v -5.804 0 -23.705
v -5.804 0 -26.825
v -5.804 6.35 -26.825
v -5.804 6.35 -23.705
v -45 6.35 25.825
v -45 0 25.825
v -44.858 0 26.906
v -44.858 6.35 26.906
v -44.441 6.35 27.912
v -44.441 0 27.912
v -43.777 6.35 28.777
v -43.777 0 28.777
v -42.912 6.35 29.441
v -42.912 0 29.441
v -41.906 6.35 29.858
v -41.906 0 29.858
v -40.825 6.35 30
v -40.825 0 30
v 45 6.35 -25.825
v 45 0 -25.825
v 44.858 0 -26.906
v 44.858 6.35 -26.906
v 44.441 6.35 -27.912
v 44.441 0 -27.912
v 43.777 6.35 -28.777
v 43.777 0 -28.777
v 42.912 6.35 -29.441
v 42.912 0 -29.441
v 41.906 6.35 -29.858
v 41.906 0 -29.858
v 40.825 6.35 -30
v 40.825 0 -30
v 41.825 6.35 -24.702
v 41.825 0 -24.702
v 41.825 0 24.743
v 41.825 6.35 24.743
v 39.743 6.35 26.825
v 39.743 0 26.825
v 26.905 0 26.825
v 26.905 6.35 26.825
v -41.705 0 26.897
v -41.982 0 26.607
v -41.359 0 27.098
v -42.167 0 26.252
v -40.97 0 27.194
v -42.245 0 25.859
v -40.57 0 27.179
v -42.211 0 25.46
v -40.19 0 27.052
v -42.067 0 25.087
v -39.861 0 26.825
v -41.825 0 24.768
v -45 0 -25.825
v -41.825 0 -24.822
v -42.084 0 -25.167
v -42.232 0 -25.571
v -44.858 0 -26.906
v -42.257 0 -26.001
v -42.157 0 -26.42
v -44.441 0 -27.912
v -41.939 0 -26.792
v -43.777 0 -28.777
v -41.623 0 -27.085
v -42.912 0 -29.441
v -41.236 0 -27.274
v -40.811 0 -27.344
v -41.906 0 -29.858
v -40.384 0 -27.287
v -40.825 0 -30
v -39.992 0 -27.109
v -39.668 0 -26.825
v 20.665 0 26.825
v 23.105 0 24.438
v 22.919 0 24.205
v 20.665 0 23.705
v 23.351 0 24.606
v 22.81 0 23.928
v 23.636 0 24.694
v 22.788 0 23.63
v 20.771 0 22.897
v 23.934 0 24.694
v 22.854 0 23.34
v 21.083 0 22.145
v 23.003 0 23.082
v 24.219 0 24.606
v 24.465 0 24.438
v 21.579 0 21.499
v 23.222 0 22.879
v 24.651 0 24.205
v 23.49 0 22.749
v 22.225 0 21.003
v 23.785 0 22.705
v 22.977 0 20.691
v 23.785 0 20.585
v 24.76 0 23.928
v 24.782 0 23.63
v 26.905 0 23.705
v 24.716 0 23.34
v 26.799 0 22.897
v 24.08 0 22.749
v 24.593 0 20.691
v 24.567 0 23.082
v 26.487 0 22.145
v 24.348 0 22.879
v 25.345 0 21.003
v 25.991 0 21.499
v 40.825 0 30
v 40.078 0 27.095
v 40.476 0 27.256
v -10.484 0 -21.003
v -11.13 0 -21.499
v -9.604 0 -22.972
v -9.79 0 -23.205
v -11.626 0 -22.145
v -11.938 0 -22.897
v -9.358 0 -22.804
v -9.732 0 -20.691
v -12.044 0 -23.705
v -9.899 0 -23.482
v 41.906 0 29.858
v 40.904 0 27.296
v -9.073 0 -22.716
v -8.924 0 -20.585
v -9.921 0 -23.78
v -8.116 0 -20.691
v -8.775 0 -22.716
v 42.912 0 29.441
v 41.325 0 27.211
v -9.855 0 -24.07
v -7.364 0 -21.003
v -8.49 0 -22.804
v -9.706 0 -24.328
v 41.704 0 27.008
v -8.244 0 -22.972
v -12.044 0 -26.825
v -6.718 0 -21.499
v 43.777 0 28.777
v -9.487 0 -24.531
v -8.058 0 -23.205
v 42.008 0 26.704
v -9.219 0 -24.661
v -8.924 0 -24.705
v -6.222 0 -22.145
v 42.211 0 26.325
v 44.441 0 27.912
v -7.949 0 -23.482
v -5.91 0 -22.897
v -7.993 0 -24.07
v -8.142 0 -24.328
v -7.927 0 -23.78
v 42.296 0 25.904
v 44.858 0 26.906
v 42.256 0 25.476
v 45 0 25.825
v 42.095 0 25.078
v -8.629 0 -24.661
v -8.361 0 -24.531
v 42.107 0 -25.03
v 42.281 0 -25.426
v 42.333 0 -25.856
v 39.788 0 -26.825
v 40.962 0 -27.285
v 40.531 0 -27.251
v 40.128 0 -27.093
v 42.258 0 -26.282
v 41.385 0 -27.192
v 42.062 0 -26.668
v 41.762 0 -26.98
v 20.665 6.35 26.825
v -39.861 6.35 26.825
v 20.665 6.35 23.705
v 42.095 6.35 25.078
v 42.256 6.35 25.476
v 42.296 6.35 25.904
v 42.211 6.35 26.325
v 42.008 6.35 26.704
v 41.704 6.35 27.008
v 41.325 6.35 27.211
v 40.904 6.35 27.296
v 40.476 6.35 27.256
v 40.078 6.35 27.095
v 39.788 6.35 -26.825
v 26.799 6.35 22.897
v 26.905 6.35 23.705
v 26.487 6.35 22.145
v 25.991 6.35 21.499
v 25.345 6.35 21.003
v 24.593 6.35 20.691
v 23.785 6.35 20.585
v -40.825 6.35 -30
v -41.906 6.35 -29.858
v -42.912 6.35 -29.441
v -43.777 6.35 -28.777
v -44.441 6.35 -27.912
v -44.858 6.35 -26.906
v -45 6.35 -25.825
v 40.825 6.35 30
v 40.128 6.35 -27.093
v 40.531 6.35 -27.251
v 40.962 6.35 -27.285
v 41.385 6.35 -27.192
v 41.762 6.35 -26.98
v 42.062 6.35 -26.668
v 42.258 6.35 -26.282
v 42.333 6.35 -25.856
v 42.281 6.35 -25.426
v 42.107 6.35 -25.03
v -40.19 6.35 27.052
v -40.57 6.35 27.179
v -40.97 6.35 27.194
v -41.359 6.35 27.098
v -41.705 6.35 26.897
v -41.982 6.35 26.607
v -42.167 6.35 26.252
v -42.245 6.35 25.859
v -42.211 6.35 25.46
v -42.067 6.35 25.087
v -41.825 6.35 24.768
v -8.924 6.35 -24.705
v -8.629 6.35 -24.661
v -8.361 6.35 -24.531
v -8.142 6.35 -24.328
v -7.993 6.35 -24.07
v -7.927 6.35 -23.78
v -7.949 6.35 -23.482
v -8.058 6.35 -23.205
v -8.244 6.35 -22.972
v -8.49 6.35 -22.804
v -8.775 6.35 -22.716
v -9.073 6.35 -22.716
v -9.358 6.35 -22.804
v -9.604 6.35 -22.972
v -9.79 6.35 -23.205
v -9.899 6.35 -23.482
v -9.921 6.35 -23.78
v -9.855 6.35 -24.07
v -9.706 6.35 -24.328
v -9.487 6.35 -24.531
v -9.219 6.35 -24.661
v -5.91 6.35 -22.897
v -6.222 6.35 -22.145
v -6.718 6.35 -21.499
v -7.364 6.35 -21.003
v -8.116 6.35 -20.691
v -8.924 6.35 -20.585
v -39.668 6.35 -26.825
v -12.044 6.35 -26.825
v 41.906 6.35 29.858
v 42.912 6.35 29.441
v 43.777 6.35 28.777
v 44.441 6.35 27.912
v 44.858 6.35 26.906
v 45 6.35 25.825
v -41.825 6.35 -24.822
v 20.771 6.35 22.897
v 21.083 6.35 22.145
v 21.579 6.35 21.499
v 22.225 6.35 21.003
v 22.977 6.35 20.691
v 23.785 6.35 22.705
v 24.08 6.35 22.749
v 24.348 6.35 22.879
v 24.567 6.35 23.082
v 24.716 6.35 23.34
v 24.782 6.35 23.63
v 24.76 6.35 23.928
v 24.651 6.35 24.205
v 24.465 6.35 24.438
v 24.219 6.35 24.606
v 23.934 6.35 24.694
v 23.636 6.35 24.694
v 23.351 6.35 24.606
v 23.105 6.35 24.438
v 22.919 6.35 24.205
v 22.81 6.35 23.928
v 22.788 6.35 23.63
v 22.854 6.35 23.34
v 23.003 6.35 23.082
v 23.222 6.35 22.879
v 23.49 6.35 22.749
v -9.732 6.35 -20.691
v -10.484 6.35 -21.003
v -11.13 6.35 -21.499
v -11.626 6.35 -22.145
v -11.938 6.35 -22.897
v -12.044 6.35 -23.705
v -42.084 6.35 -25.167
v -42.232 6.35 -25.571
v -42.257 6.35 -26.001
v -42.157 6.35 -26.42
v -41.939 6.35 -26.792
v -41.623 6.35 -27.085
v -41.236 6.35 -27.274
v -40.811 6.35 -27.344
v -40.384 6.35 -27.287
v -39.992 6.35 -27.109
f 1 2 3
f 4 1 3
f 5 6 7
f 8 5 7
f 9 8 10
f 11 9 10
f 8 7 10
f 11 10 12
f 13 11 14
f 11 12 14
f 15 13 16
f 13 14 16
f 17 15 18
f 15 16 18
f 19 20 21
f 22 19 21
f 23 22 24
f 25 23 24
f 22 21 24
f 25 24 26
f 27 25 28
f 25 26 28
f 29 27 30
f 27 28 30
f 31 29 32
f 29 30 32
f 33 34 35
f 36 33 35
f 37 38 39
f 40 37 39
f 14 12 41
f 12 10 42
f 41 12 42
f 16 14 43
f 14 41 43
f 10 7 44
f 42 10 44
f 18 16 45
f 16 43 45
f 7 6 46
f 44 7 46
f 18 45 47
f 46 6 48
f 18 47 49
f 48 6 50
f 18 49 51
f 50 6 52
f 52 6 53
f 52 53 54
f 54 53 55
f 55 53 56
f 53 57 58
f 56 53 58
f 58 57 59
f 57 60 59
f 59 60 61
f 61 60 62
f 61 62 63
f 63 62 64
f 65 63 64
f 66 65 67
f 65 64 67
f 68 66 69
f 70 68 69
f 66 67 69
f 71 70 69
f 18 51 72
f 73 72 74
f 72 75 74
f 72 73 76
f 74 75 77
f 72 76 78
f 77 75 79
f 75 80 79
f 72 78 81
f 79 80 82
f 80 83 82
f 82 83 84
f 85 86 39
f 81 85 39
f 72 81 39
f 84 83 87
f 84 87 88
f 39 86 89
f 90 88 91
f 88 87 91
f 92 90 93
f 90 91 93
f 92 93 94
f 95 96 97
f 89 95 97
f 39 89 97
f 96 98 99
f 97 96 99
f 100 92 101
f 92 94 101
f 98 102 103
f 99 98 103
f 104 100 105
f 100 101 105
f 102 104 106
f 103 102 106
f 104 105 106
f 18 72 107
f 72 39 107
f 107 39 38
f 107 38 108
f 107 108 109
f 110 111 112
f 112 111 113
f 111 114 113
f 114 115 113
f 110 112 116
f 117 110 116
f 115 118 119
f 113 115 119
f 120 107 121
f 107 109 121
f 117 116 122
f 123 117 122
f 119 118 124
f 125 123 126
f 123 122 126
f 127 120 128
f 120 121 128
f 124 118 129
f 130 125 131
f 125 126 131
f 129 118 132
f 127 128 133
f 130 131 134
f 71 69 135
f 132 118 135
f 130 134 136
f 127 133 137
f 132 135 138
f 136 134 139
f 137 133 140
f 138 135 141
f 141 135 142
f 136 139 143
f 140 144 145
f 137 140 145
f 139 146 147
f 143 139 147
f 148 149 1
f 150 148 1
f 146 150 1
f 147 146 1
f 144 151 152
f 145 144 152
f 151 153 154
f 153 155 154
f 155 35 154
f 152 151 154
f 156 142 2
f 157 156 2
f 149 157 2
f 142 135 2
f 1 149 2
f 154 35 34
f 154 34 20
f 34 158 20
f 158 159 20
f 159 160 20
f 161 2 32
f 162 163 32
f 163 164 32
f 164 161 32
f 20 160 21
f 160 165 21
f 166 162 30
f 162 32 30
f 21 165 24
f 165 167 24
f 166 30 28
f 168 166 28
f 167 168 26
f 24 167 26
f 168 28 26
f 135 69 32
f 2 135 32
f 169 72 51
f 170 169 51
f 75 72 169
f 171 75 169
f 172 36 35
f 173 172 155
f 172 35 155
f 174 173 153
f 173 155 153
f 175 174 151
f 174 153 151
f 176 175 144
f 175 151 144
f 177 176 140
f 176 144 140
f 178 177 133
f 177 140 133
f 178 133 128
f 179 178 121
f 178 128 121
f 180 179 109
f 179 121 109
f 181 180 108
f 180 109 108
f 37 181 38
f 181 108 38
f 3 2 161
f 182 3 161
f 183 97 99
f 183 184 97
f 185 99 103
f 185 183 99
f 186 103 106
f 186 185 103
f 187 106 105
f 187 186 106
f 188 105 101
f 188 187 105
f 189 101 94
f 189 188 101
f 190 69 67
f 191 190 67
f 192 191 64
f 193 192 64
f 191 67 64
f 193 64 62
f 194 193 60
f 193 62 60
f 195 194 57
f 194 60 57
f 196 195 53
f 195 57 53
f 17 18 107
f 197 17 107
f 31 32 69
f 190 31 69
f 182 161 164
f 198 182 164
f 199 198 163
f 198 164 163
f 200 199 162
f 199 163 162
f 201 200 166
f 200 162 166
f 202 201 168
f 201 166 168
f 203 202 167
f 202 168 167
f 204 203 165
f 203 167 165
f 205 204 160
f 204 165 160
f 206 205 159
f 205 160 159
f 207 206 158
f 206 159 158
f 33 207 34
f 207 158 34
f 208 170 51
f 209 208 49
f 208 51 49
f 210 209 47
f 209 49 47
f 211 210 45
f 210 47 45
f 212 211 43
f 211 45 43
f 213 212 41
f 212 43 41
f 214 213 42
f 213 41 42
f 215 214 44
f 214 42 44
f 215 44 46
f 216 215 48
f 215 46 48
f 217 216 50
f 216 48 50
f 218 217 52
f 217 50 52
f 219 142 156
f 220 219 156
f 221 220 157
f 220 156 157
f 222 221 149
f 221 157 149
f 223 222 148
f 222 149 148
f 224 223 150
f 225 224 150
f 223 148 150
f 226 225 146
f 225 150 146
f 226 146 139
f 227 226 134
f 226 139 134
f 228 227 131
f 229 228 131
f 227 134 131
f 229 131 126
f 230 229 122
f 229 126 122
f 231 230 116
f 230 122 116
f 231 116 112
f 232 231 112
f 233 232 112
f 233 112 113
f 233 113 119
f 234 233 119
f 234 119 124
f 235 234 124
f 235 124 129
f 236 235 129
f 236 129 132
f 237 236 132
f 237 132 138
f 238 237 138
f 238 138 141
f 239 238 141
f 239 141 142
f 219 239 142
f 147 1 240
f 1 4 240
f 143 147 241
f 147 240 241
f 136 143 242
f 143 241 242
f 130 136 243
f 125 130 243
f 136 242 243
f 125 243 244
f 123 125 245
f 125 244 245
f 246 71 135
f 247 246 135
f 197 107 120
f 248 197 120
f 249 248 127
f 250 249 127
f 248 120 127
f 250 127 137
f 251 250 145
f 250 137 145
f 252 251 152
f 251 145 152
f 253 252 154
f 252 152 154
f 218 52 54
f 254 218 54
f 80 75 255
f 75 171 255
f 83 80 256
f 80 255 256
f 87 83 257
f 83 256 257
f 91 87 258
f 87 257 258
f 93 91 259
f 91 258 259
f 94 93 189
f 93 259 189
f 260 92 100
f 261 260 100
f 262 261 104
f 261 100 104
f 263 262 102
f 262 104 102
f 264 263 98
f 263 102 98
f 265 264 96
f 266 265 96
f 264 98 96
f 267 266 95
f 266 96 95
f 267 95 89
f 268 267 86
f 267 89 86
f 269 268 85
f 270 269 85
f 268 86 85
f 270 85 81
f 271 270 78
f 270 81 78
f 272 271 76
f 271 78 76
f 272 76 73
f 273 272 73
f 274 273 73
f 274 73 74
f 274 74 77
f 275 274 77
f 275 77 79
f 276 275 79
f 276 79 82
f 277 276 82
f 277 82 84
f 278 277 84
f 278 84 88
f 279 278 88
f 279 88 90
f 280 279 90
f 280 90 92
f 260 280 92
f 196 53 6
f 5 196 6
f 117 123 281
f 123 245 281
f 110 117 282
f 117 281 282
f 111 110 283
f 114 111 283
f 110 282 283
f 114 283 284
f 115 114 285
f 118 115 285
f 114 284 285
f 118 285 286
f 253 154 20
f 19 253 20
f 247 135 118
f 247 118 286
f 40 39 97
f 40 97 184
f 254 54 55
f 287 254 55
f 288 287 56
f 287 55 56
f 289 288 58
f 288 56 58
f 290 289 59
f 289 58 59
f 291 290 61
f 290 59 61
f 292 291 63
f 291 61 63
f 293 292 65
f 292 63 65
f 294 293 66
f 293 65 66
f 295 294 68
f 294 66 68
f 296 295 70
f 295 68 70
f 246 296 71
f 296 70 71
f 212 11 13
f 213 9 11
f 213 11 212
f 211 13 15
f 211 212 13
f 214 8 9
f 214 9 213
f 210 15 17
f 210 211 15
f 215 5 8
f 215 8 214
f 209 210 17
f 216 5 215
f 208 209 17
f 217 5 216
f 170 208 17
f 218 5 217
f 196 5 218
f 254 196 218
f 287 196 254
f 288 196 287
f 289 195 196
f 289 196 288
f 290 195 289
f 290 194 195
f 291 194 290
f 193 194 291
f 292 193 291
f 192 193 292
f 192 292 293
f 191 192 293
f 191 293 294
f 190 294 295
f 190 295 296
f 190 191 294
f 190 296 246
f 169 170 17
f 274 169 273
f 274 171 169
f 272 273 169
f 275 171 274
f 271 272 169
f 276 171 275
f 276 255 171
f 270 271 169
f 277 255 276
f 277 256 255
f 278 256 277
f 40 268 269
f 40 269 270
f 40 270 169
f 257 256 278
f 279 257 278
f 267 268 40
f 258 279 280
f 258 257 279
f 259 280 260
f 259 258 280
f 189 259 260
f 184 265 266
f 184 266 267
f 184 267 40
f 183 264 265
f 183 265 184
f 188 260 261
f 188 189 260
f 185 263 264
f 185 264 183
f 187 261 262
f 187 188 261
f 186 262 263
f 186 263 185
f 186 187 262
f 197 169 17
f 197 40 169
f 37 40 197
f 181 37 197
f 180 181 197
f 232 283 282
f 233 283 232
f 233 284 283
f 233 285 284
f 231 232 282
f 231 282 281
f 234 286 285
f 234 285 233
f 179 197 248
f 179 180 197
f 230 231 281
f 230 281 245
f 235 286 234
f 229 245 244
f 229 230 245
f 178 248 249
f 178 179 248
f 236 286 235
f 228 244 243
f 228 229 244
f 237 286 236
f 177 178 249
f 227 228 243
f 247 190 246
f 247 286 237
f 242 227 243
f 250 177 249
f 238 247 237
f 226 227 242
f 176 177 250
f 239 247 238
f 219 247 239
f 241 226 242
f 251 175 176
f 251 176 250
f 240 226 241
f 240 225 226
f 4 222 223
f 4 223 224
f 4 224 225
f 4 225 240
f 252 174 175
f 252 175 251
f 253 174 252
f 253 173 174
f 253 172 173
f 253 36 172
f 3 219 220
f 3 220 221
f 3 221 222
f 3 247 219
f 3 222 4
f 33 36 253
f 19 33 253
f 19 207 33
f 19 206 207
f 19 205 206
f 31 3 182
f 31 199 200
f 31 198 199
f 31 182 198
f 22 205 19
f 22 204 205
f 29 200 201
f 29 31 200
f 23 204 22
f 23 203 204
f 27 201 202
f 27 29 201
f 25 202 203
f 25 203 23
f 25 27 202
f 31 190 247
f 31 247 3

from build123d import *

# Parameters (mm, degrees)
BOSS_EXTRUDE3_DEPTH = 6.35
SKETCH3_W           = 6.24
SKETCH3_H           = 6.35
BOSS_EXTRUDE4_DEPTH = 6.24
FILLET1_R           = 3.12
SKETCH4_R           = 1
CUT_EXTRUDE1_DEPTH  = 55.454774814
SKETCH5_R           = 1.4224
SKETCH5_R_2         = 1.4732
CUT_EXTRUDE2_DEPTH  = 55.454774814
SKETCH6_W           = 6.24
SKETCH6_H           = 6.35
BOSS_EXTRUDE5_DEPTH = 6.24
SKETCH7_R           = 1
CUT_EXTRUDE3_DEPTH  = 55.454774814
FILLET3_R           = 3.12


with BuildPart() as part:
    # Sketch2 → Boss-Extrude3 (new body)
    with BuildSketch(Plane(origin=(0, 0, 0), x_dir=(1, 0, 0), z_dir=(0, 1, 0))):
        with BuildLine():
            Line((-45, 25.825), (-45, -25.825))
            ThreePointArc((-45, -25.825), (-43.777170811, -28.777170811), (-40.825, -30))
            Line((-40.825, -30), (40.825, -30))
            ThreePointArc((40.825, -30), (43.777170811, -28.777170811), (45, -25.825))
            Line((45, -25.825), (45, 25.825))
            ThreePointArc((45, 25.825), (43.777170811, 28.777170811), (40.825, 30))
            Line((40.825, 30), (-40.825, 30))
            ThreePointArc((-40.825, 30), (-43.777170811, 28.777170811), (-45, 25.825))
        make_face()
        with BuildLine():
            Line((-41.825, -25.825), (-41.825, 25.825))
            ThreePointArc((-41.825, 25.825), (-41.532106781, 26.532106781), (-40.825, 26.825))
            Line((-40.825, 26.825), (40.825, 26.825))
            ThreePointArc((40.825, 26.825), (41.532106781, 26.532106781), (41.825, 25.825))
            Line((41.825, 25.825), (41.825, -25.825))
            ThreePointArc((41.825, -25.825), (41.532106781, -26.532106781), (40.825, -26.825))
            Line((40.825, -26.825), (-40.825, -26.825))
            ThreePointArc((-40.825, -26.825), (-41.532106781, -26.532106781), (-41.825, -25.825))
        make_face(mode=Mode.SUBTRACT)
    extrude(amount=BOSS_EXTRUDE3_DEPTH)

    # Sketch3 → Boss-Extrude4 (add)
    with BuildSketch(Plane(origin=(-7.875425543, 0, 26.825), x_dir=(-1, 0, 0), z_dir=(0, 0, -1))):
        with Locations((-31.660425543, 3.175)):
            Rectangle(SKETCH3_W, SKETCH3_H)
    extrude(amount=BOSS_EXTRUDE4_DEPTH)

    # Fillet1
    fillet1_edges = [part.edges().sort_by_distance(p)[0] for p in [
        (20.665, 3.175, 20.585),
        (26.905, 3.175, 20.585),
    ]]
    fillet(fillet1_edges, radius=FILLET1_R - 0.0001)  # a hair under: the kernel refuses the full size

    # Sketch4 → Cut-Extrude1 (cut, through all)
    with BuildSketch(Plane.XZ):
        with Locations(Location((23.785, 23.705, 0), (0, 0, 270))):
            Circle(SKETCH4_R)
    extrude(amount=-CUT_EXTRUDE1_DEPTH, mode=Mode.SUBTRACT)

    # Sketch5 → Cut-Extrude2 (cut, through all)
    with BuildSketch(Plane.XZ):
        with Locations((-40.824987904, 25.779417466)):
            Circle(SKETCH5_R)
        with Locations((40.825, 25.825)):
            Circle(SKETCH5_R_2)
        with Locations((40.86022953, -25.814867613)):
            Circle(SKETCH5_R_2)
        with Locations((-40.789751469, -25.870570514)):
            Circle(SKETCH5_R_2)
    extrude(amount=-CUT_EXTRUDE2_DEPTH, mode=Mode.SUBTRACT)

    # Sketch6 → Boss-Extrude5 (add)
    with BuildSketch(Plane.XY.offset(-26.825)):
        with Locations((-8.92393673, 3.175)):
            Rectangle(SKETCH6_W, SKETCH6_H)
    extrude(amount=BOSS_EXTRUDE5_DEPTH)

    # Sketch7 → Cut-Extrude3 (cut, through all)
    with BuildSketch(Plane(origin=(0, 0, 0), x_dir=(-1, 0, 0), z_dir=(0, -1, 0))):
        with Locations(Location((8.92393673, 23.705, 0), (0, 0, 90))):
            Circle(SKETCH7_R)
    extrude(amount=-CUT_EXTRUDE3_DEPTH, mode=Mode.SUBTRACT)

    # Fillet3
    fillet3_edges = [part.edges().sort_by_distance(p)[0] for p in [
        (-5.80393673, 3.175, -20.585),
        (-12.04393673, 3.175, -20.585),
    ]]
    fillet(fillet3_edges, radius=FILLET3_R - 0.0001)  # a hair under: the kernel refuses the full size


solid = part.part
